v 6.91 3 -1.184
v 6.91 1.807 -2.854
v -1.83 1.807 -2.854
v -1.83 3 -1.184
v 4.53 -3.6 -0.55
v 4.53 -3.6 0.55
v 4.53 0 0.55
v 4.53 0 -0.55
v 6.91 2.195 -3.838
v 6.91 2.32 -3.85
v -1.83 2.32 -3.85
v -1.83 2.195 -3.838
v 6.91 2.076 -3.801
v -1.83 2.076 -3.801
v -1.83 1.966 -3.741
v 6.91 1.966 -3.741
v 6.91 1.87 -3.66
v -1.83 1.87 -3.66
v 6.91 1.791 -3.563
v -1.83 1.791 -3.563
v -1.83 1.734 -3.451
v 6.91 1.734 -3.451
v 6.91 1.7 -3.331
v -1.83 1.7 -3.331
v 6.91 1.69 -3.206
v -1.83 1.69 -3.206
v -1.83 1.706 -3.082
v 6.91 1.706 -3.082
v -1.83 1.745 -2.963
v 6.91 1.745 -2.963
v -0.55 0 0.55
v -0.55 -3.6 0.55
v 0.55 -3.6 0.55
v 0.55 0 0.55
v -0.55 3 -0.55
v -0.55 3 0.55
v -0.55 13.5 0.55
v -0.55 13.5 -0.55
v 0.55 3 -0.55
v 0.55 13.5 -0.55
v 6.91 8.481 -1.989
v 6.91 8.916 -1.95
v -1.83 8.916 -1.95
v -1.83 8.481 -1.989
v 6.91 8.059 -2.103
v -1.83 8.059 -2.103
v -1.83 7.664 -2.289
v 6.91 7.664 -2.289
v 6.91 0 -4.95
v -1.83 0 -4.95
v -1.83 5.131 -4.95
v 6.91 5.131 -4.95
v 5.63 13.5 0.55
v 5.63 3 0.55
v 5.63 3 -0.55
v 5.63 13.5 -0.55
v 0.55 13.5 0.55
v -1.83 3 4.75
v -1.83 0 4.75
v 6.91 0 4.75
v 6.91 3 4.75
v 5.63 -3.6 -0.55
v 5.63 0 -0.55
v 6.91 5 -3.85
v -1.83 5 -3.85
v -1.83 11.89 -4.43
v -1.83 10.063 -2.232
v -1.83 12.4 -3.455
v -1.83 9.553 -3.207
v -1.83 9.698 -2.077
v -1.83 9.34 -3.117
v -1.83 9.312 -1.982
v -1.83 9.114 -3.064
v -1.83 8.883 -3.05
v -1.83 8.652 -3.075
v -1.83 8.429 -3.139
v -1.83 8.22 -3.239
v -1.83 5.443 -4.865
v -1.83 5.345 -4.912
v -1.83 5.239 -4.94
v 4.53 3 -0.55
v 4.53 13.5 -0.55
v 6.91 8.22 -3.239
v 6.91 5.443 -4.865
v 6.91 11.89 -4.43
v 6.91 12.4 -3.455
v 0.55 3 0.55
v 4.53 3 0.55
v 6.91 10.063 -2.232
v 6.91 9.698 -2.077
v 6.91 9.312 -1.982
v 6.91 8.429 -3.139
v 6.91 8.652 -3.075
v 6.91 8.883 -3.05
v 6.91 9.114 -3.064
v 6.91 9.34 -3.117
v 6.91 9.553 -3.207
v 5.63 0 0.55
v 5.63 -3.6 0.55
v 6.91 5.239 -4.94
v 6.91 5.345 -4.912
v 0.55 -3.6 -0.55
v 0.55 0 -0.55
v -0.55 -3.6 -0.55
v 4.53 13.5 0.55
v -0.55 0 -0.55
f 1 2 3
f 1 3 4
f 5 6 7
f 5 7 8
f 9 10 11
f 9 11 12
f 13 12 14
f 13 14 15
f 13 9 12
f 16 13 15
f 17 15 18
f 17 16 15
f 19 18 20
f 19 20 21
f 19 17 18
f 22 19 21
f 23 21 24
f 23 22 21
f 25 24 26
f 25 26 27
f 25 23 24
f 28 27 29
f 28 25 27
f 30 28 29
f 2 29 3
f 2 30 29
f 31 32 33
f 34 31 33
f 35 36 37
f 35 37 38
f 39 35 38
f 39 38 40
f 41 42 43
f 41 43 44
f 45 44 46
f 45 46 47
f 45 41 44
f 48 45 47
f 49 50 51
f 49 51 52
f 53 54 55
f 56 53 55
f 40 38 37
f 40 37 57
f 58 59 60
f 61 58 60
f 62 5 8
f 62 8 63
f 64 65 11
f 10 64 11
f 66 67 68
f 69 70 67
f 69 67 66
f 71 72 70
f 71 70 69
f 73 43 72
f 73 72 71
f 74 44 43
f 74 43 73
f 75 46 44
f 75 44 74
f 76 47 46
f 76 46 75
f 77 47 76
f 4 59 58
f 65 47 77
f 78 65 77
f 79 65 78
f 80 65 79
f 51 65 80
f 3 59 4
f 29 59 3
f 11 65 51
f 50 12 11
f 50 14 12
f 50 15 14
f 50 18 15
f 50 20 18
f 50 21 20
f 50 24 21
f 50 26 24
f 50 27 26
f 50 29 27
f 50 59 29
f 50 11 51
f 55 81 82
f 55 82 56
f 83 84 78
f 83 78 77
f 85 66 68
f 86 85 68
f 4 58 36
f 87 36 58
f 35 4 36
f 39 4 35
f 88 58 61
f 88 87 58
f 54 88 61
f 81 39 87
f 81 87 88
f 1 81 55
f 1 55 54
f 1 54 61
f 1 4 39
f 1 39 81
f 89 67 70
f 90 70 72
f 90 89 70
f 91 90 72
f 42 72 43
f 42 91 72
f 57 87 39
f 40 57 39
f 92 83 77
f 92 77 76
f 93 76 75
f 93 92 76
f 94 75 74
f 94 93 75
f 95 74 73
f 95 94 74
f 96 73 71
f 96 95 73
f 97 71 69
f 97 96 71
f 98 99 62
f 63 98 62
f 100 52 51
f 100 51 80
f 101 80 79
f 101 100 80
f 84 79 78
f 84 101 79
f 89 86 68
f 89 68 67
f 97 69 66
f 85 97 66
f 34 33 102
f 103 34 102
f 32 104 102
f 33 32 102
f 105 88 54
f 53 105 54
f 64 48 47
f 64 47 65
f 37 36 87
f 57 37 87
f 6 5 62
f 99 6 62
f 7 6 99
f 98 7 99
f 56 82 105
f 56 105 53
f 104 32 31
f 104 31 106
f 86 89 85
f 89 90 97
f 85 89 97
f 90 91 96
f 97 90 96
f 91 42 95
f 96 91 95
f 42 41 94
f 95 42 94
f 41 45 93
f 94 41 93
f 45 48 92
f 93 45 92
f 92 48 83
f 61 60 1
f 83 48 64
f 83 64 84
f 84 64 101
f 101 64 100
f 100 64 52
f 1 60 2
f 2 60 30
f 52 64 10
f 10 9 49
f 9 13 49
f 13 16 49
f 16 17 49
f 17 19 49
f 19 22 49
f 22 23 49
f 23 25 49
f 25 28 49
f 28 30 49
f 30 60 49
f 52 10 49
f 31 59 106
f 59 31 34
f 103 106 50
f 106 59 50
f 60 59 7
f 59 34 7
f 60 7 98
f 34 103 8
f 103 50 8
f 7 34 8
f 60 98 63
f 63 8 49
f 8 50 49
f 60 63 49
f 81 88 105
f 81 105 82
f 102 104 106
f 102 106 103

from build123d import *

# Parameters (mm, degrees)
CROQUIS1_W                   = 8.74
CROQUIS1_H                   = 9.7
CROQUIS1_W_2                 = 1.1
CROQUIS1_H_2                 = 1.1
SALIENTE_EXTRUIR1_DEPTH      = 3
CROQUIS2_W                   = 8.74
CROQUIS2_H                   = 3
SALIENTE_EXTRUIR2_DEPTH      = 9.4
CORTAR_EXTRUIR1_DEPTH        = 9
SALIENTE_EXTRUIR3_DEPTH      = 13.5
SALIENTE_EXTRUIR3_DEPTH_BACK = 3.6
CROQUIS5_W                   = 1.1
CROQUIS5_H                   = 1.1


with BuildPart() as part:
    # Croquis1 → Saliente-Extruir1 (new body)
    with BuildSketch(Plane(origin=(0, 0, 0), x_dir=(1, 0, 0), z_dir=(0, 1, 0))):
        with Locations((2.54, 0.1)):
            Rectangle(CROQUIS1_W, CROQUIS1_H)
        Rectangle(CROQUIS1_W_2, CROQUIS1_H_2, mode=Mode.SUBTRACT)
        with Locations((5.08, 0)):
            Rectangle(CROQUIS1_W_2, CROQUIS1_H_2, mode=Mode.SUBTRACT)
    extrude(amount=SALIENTE_EXTRUIR1_DEPTH)

    # Croquis2 → Saliente-Extruir2 (add)
    with BuildSketch(Plane(origin=(0, 3, 0), x_dir=(1, 0, 0), z_dir=(0, 1, 0))):
        with Locations((2.54, 3.45)):
            Rectangle(CROQUIS2_W, CROQUIS2_H)
    extrude(amount=SALIENTE_EXTRUIR2_DEPTH)

    # Croquis3 → Cortar-Extruir1 (cut)
    with BuildSketch(Plane.ZY.offset(1.83)):
        with BuildLine():
            Line((-1.95, 3), (-1.95, 8.9155089))
            ThreePointArc((-1.95, 8.9155089), (-2.036358841, 8.267369623), (-2.28940975, 7.664453701))
            Line((-2.28940975, 7.664453701), (-3.85, 5))
            Line((-3.85, 5), (-3.85, 2.319959731))
            ThreePointArc((-3.85, 2.319959731), (-3.508458272, 1.760049187), (-2.854318236, 1.807497933))
            Line((-2.854318236, 1.807497933), (-1.184444515, 3))
            Line((-1.184444515, 3), (-1.95, 3))
        make_face()
        with BuildLine():
            Line((-1.95, 12.4), (-3.455311447, 12.4))
            Line((-3.455311447, 12.4), (-2.232277415, 10.063467416))
            ThreePointArc((-2.232277415, 10.063467416), (-2.021605007, 9.506586156), (-1.95, 8.9155089))
            Line((-1.95, 8.9155089), (-1.95, 12.4))
        make_face()
        with BuildLine():
            Line((-4.95, 12.4), (-4.95, 5.130923429))
            ThreePointArc((-4.95, 5.130923429), (-4.928460036, 5.292584893), (-4.865343077, 5.442966568))
            Line((-4.865343077, 5.442966568), (-3.238584298, 8.220392257))
            ThreePointArc((-3.238584298, 8.220392257), (-3.050389859, 8.882763545), (-3.206840185, 9.553342522))
            Line((-3.206840185, 9.553342522), (-4.429874218, 11.889875107))
            Line((-4.429874218, 11.889875107), (-3.455311447, 12.4))
            Line((-3.455311447, 12.4), (-4.95, 12.4))
        make_face()
    extrude(amount=-CORTAR_EXTRUIR1_DEPTH, mode=Mode.SUBTRACT)

    # Croquis5 → Saliente-Extruir3 (add, two sides: drawn at the far end of the back side and taken through both)
    with BuildSketch(Plane(origin=(0, 0, 0), x_dir=(1, 0, 0), z_dir=(0, 1, 0)).offset(-SALIENTE_EXTRUIR3_DEPTH_BACK)):
        with Locations((5.08, 0)):
            Rectangle(CROQUIS5_W, CROQUIS5_H)
        Rectangle(CROQUIS5_W, CROQUIS5_H)
    extrude(amount=SALIENTE_EXTRUIR3_DEPTH + SALIENTE_EXTRUIR3_DEPTH_BACK)


solid = part.part
